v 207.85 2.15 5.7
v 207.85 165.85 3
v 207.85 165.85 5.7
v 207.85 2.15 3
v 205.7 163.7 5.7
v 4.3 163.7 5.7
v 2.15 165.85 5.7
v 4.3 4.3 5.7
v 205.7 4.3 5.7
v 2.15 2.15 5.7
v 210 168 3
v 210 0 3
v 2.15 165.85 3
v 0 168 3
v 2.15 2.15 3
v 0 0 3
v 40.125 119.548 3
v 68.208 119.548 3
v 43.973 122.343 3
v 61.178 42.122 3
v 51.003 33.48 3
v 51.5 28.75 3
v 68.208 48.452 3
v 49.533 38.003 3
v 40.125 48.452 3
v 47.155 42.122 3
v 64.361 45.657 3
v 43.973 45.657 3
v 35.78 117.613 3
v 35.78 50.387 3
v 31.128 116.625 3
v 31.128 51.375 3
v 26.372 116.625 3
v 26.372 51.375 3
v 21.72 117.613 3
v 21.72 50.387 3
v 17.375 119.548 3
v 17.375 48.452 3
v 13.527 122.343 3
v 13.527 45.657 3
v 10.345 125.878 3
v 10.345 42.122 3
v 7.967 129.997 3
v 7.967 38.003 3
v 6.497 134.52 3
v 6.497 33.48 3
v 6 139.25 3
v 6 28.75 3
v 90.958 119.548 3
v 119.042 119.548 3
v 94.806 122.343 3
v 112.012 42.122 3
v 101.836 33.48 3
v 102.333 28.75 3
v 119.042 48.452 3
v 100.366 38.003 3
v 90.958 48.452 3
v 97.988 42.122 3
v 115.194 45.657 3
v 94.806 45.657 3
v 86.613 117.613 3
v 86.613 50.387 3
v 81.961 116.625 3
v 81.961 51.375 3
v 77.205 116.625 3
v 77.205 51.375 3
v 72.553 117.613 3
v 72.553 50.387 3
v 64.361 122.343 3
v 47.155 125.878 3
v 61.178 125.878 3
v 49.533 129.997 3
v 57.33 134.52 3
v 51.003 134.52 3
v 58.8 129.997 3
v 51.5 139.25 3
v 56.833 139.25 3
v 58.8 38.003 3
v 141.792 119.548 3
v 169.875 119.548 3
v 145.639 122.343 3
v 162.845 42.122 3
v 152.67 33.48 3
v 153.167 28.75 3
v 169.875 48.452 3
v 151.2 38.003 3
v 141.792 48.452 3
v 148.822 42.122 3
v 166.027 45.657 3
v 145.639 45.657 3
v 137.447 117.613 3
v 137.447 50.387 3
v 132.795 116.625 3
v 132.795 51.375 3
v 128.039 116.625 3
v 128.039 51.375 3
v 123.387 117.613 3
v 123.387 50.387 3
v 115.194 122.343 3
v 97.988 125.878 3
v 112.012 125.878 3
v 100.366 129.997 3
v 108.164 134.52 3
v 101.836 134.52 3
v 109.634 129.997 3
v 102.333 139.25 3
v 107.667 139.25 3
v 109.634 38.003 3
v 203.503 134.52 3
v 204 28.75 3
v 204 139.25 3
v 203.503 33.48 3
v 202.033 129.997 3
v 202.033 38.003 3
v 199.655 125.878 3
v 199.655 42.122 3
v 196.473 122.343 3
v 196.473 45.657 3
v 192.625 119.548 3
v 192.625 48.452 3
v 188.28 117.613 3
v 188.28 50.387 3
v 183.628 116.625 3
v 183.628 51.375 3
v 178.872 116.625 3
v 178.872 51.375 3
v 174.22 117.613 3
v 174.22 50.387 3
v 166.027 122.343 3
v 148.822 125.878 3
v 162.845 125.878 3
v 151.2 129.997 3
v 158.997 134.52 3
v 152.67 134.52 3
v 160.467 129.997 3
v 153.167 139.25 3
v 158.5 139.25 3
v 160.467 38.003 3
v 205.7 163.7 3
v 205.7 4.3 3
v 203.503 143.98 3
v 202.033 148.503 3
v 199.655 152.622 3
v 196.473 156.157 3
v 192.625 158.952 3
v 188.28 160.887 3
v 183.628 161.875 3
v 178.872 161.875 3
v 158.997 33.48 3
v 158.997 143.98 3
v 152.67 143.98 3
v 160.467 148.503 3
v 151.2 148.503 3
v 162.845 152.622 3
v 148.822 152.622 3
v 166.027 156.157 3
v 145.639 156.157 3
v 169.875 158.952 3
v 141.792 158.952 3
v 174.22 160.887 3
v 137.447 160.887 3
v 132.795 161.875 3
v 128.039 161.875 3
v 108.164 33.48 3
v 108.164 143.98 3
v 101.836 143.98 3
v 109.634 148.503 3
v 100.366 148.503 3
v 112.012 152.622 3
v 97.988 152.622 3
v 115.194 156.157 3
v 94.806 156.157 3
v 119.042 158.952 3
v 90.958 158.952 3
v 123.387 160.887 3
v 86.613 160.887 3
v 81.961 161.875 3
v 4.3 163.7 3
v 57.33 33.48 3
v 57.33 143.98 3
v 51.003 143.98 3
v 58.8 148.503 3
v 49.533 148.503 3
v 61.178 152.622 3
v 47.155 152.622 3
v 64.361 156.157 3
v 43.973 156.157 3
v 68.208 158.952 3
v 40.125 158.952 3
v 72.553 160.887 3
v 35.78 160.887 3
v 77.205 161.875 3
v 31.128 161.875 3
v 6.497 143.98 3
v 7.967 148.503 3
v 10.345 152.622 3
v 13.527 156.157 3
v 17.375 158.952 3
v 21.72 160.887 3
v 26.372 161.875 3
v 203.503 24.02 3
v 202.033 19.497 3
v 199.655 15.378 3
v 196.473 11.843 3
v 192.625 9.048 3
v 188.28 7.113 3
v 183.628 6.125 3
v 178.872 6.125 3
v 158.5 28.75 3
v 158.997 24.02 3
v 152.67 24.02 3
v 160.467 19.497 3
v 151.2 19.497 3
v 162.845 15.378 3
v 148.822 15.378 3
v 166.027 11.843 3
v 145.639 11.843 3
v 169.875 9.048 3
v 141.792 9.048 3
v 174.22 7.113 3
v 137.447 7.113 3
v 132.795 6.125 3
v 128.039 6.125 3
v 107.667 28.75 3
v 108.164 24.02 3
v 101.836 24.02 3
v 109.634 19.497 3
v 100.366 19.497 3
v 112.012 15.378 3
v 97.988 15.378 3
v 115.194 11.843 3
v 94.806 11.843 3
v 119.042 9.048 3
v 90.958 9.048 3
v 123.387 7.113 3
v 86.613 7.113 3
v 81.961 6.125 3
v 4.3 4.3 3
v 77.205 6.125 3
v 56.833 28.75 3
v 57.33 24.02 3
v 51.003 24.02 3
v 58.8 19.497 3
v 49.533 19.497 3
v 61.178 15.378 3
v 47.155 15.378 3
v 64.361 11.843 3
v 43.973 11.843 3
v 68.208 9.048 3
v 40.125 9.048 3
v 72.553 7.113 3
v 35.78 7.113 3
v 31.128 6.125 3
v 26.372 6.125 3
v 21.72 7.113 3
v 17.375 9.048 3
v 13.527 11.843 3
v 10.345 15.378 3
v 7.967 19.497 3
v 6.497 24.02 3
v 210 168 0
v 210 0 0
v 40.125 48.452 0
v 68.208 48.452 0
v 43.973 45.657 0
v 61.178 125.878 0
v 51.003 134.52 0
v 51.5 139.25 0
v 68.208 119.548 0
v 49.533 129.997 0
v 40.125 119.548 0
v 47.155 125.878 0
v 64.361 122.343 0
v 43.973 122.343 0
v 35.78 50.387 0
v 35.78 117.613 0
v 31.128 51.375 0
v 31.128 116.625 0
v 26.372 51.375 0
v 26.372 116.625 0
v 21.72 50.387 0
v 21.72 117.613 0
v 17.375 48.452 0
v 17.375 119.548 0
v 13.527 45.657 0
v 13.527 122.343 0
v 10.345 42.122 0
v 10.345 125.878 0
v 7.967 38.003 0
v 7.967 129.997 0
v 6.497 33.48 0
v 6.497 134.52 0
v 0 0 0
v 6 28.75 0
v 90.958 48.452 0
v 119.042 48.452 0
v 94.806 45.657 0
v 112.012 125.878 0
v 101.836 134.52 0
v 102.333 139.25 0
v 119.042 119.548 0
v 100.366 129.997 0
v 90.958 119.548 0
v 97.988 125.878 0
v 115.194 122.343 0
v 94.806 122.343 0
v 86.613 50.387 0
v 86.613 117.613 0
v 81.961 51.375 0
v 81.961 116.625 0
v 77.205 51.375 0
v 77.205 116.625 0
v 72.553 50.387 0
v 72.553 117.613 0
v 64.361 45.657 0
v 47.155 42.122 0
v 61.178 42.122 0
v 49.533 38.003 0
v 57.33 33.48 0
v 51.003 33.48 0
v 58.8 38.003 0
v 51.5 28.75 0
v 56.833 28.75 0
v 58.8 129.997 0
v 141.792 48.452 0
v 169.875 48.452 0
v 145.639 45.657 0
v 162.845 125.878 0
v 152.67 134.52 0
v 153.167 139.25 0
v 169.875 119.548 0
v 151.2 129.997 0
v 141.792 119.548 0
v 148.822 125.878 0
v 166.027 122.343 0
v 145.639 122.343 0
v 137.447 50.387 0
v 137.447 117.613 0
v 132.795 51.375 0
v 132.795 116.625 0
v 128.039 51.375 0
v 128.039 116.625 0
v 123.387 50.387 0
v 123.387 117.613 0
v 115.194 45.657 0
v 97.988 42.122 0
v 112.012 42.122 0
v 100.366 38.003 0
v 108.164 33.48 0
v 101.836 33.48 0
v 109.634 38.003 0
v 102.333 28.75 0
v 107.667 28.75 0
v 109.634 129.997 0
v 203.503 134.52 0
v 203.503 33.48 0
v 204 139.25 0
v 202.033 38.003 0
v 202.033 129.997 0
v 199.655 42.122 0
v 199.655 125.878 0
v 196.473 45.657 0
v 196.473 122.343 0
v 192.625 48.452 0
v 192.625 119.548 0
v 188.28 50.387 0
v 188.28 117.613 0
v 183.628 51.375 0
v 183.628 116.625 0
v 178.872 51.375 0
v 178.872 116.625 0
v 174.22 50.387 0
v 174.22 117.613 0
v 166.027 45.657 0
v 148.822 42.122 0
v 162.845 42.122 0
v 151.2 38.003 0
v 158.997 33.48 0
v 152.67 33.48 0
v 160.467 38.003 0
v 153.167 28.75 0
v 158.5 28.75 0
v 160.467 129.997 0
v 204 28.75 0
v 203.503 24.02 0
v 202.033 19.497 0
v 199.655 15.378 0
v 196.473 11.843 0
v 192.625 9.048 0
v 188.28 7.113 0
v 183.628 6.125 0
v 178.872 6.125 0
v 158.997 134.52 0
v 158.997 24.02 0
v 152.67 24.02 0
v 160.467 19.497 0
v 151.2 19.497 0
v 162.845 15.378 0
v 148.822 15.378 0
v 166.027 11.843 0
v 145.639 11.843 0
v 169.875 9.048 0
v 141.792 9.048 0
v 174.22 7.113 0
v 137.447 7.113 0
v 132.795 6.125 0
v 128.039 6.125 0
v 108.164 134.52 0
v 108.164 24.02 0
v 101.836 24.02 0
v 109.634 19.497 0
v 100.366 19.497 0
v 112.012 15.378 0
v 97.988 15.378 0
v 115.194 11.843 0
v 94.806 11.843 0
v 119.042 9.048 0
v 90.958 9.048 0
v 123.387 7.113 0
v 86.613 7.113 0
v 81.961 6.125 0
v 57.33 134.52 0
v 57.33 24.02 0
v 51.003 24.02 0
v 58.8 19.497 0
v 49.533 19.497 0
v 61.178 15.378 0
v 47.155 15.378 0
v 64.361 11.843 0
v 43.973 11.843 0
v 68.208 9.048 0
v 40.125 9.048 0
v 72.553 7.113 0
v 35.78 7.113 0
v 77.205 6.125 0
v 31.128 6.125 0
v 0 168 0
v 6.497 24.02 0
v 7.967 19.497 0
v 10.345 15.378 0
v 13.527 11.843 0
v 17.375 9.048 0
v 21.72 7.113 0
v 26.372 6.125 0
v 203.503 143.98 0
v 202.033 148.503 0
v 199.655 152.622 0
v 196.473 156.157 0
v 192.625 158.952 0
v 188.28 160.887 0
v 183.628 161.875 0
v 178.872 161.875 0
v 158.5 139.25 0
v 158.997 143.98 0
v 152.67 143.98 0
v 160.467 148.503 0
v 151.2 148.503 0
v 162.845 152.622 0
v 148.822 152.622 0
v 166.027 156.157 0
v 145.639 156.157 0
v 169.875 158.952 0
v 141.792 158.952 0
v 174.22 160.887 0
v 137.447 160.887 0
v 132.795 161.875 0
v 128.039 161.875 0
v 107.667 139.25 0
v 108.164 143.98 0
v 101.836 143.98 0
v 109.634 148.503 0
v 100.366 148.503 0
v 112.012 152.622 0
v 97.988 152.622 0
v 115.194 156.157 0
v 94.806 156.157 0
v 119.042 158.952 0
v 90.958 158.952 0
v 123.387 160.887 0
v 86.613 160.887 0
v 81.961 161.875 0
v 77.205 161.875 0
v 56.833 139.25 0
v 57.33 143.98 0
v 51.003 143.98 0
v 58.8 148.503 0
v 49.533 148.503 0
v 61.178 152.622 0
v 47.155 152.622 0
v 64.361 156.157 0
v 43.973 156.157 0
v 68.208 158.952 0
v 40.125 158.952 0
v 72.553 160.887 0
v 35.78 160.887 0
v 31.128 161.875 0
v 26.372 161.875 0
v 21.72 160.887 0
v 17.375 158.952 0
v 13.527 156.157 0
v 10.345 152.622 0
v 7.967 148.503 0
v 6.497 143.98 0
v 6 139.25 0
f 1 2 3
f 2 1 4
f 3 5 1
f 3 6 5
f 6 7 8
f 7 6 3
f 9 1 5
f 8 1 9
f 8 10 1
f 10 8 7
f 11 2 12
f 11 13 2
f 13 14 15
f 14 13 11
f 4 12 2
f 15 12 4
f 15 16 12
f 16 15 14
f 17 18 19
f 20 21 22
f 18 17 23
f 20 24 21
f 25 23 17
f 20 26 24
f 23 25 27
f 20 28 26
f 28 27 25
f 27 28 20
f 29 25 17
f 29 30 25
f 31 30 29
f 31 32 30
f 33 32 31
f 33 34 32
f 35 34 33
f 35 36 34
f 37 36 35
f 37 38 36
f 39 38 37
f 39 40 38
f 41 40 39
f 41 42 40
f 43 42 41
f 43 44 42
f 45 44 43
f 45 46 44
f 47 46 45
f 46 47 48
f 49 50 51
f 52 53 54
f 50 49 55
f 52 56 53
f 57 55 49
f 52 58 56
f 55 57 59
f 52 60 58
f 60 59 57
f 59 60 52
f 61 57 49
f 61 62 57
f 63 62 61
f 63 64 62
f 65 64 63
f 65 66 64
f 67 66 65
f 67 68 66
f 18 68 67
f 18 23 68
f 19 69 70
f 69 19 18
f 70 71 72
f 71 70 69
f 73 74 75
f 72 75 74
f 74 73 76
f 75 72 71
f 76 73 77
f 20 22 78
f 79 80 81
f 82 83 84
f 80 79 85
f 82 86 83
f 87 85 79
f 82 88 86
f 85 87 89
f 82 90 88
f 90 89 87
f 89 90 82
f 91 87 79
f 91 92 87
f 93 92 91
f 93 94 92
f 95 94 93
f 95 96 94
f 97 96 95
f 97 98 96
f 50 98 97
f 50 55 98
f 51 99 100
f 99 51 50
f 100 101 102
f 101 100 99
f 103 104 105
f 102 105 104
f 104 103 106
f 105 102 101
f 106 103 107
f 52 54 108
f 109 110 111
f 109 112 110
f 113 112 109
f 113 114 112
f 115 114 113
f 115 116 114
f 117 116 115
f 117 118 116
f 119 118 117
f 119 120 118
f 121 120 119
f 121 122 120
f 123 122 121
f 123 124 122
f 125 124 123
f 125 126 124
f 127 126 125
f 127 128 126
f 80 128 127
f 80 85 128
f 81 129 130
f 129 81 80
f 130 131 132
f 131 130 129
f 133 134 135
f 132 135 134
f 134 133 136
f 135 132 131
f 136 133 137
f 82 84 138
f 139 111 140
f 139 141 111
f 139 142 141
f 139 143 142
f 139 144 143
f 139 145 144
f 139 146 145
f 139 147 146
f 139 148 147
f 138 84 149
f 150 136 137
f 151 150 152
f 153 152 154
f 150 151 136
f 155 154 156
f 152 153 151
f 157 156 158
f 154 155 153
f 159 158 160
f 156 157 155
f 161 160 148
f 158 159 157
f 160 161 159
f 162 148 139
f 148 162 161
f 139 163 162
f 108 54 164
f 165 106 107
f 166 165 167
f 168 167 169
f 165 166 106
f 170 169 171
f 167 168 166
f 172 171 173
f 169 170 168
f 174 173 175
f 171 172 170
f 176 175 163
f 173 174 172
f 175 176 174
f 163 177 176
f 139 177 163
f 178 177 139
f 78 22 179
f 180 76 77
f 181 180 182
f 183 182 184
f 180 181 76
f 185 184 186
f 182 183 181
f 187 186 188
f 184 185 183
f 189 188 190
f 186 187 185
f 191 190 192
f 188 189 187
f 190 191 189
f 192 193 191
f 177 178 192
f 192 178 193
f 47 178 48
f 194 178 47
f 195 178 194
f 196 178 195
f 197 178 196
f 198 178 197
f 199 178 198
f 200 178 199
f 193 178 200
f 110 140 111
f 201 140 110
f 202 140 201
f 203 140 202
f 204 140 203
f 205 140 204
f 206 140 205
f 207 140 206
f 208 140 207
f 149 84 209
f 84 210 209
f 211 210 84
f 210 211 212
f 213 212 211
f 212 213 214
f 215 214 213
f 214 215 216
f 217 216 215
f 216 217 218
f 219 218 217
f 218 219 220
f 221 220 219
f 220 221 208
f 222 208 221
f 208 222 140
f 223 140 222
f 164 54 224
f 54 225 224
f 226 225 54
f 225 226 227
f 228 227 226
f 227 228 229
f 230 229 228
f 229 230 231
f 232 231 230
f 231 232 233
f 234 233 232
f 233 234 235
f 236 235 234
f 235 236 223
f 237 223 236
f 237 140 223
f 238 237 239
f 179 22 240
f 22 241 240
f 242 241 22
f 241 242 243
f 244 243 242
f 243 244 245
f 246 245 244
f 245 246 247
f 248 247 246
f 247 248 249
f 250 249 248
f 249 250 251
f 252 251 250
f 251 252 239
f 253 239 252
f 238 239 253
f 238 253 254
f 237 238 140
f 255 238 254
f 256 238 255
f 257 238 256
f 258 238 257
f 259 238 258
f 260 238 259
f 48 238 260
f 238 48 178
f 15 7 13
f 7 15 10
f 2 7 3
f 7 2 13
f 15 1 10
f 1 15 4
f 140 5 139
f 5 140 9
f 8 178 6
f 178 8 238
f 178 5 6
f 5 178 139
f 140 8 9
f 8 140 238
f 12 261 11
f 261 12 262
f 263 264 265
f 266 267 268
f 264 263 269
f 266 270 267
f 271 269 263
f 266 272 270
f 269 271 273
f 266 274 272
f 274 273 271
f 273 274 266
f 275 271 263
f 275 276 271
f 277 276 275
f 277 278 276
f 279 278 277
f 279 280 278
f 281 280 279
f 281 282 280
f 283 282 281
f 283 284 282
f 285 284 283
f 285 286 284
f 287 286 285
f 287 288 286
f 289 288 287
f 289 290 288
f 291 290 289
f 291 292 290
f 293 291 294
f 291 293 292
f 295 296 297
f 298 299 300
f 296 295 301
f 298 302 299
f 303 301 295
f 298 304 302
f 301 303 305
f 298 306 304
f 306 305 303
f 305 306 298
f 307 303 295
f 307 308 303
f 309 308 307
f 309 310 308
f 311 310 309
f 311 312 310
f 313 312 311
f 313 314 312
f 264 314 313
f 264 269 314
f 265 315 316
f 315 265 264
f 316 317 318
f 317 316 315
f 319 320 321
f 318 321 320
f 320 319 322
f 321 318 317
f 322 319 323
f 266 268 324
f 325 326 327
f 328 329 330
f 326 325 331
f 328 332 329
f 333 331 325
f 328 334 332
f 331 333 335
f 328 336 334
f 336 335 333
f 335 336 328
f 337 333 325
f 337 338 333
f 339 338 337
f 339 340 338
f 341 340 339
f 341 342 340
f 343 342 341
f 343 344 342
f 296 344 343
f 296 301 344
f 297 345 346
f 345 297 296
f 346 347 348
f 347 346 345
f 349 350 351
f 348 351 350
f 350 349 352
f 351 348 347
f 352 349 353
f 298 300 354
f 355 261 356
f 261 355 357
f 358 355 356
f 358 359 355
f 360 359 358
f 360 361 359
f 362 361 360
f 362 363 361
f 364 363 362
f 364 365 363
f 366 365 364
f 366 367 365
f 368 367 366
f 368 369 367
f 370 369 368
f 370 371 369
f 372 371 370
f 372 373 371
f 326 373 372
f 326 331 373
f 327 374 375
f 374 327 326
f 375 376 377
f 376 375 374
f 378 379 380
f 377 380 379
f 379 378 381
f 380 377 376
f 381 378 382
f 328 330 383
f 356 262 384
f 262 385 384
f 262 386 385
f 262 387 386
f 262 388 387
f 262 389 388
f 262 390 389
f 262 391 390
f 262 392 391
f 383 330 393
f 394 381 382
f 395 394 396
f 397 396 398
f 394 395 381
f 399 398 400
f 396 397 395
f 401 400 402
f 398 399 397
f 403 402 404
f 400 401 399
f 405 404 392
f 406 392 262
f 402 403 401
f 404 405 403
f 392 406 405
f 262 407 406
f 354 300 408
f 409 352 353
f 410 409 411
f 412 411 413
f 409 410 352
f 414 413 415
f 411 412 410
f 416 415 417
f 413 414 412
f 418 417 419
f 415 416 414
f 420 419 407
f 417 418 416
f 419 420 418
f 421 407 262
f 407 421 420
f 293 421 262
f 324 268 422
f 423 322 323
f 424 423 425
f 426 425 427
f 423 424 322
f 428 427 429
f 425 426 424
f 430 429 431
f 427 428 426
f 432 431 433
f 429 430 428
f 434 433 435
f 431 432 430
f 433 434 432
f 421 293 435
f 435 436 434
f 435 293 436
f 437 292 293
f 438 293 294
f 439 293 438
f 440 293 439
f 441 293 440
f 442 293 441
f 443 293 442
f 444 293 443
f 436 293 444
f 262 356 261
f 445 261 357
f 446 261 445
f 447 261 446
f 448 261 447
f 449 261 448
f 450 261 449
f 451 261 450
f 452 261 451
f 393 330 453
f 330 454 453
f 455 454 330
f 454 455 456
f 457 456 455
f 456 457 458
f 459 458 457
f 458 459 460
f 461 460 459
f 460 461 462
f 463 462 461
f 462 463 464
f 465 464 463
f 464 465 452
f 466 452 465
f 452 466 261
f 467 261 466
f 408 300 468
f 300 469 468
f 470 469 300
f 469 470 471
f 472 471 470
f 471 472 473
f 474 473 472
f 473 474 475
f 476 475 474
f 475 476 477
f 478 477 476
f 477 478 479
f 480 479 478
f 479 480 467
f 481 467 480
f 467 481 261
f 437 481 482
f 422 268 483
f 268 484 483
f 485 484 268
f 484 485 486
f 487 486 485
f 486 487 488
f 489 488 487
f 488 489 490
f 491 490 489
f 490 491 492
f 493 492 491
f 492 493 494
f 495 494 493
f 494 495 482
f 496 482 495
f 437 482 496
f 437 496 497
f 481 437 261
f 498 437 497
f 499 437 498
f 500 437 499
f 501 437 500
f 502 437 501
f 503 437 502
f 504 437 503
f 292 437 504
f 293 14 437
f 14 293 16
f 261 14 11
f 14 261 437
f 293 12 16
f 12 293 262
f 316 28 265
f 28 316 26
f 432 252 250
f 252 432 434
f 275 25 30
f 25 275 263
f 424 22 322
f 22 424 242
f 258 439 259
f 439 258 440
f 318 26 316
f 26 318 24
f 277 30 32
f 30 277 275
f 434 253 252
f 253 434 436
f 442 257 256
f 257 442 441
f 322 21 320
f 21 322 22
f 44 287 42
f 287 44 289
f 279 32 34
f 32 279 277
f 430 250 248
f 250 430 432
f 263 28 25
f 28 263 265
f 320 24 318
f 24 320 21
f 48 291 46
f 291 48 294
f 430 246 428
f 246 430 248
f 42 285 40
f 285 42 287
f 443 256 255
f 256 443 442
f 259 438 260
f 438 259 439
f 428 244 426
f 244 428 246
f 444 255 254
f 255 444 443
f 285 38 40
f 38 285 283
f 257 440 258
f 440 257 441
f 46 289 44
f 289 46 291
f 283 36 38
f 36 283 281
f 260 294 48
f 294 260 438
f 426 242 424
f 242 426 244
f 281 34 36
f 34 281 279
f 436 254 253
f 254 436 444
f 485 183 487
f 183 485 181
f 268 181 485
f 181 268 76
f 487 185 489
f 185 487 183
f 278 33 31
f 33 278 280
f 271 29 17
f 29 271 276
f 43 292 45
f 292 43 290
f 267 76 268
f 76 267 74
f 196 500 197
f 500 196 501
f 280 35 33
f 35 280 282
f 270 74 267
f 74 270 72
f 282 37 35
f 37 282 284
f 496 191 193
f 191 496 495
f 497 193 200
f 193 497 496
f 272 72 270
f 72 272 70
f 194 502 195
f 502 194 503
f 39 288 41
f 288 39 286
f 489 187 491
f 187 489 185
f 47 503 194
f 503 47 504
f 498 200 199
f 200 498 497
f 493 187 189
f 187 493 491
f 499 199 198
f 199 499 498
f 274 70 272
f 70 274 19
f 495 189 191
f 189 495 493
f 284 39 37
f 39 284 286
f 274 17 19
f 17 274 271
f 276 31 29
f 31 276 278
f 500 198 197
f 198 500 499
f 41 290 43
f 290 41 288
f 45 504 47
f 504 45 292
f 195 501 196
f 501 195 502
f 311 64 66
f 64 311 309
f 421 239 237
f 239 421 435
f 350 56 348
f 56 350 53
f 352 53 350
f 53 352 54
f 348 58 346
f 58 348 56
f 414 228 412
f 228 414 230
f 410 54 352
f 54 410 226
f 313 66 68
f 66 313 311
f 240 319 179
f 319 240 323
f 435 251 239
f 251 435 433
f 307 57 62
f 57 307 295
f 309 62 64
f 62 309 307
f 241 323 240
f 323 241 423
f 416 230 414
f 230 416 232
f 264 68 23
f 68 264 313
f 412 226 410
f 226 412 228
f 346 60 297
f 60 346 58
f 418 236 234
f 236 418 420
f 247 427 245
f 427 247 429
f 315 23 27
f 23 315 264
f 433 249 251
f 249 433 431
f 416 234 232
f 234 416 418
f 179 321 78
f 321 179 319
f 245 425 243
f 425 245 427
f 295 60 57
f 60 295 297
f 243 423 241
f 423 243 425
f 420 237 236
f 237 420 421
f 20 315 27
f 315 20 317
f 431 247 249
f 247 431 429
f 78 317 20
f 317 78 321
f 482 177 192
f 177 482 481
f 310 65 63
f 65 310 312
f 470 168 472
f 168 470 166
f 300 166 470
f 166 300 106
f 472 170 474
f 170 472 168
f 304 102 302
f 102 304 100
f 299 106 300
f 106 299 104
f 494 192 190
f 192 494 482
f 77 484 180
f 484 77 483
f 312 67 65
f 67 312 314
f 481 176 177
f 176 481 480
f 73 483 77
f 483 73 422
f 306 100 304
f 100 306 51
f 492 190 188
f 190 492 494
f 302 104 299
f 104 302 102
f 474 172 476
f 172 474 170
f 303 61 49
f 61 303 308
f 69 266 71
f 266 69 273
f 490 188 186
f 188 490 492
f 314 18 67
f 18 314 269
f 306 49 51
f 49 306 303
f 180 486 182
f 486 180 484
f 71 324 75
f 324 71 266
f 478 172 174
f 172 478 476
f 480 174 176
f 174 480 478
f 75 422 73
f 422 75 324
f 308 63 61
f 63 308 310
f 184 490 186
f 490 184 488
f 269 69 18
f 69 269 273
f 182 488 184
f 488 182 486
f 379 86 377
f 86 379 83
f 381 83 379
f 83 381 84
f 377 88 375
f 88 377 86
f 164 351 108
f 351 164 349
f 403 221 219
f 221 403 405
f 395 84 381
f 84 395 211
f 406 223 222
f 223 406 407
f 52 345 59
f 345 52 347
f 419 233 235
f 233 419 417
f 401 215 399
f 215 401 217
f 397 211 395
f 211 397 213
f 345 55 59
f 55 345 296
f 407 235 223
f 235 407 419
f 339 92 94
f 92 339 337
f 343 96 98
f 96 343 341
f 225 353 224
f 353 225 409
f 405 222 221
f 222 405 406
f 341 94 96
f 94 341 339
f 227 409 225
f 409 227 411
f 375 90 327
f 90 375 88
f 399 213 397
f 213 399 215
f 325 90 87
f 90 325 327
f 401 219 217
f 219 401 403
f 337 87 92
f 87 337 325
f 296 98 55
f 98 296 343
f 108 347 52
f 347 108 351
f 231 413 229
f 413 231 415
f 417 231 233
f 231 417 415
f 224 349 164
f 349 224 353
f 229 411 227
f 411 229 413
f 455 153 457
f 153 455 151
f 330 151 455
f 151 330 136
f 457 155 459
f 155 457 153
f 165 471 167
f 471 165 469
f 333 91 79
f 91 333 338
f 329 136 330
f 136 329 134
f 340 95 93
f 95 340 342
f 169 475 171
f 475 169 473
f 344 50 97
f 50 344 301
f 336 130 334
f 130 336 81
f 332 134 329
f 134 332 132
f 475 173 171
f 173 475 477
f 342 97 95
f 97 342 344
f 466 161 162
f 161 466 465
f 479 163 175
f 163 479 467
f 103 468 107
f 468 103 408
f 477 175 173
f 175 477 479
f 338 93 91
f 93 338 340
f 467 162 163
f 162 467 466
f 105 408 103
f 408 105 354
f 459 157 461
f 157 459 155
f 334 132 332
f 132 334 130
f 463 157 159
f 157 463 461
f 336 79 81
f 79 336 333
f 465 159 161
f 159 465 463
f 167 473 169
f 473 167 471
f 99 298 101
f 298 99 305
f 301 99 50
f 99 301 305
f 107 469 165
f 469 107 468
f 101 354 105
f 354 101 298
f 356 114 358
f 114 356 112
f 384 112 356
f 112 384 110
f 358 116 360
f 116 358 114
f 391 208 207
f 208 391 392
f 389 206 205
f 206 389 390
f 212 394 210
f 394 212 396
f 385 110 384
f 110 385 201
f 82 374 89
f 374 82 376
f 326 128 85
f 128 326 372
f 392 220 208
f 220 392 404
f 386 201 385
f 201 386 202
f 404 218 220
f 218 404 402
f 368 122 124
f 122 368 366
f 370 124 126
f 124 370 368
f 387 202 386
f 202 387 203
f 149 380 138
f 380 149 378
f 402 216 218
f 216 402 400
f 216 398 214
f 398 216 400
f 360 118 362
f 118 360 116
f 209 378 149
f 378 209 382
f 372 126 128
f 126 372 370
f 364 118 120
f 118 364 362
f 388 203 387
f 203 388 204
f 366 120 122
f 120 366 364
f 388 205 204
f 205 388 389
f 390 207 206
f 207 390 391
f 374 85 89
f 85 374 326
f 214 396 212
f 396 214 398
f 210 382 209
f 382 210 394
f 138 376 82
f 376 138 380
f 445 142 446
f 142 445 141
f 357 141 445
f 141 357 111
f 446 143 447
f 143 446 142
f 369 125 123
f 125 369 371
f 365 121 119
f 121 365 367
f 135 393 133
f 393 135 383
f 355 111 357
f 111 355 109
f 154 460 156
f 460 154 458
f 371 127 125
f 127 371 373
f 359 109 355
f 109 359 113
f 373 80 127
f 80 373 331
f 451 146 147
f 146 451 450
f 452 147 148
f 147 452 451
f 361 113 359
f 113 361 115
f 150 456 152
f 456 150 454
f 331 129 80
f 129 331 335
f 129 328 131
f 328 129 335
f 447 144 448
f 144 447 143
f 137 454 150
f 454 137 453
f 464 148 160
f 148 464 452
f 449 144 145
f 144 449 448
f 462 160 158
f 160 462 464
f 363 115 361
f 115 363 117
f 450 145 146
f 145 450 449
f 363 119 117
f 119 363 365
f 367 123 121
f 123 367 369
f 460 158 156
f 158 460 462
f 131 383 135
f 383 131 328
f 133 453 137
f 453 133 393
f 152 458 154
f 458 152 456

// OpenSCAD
// Parameters //
// grid(x/y) is gridfinity grids
gridx = 5;
gridy = 4;
// hole(x/y) is kcup quantity
holex = 4;
holey = 2;


/* [Advance Variables] */
cube_length = gridx*42; 
cube_width = gridy*42;   
cube_thickness = 3; 

sc_offset = 2.15;
sc_height = 2.7 ;
hollow_offset = 2 * sc_offset;

sc_length = cube_length - sc_offset; //small cube
sc_width = cube_width - sc_offset;   
sc_thickness = cube_thickness - sc_offset; 


cylinder_diameter = 45.5; // Diameter of the cylinders
cylinder_height = cube_thickness; // Height of the cylinders, same as cube thickness
cylinder_spacing = 5.5; // Spacing between the cylinders
cylinder_count_x = holex; // Number of cylinders in the X direction
cylinder_count_y = holey; // Number of cylinders in the Y direction
cylinder_offset = 6; // Offset from the cube's sides



// Calculate spacing needed inside the cube
spacing_x = (cube_length - 2 * cylinder_offset - cylinder_diameter) / (cylinder_count_x - 1);
spacing_y = (cube_width - 2 * cylinder_offset - cylinder_diameter) / (cylinder_count_y - 1);

// Create the main cube


 
difference()  {
    
    union(){
    cube([cube_length,cube_width, cube_thickness]); // big boi
        union(){
          difference()  {
            translate([sc_offset,sc_offset,cube_thickness])
             cube([cube_length - 2*sc_offset,cube_width - 2*sc_offset, sc_height]); // small boi
                 
             translate([hollow_offset,hollow_offset,cube_thickness]) 
             cube([cube_length - 2*hollow_offset,cube_width - 2*hollow_offset, sc_height]);
                        }
               }  
           }
      
     // Create a grid of cylinders
     for (i = [0:cylinder_count_x - 1]) {
        for (j = [0:cylinder_count_y - 1]) {
            x = i * spacing_x + cylinder_offset + cylinder_diameter / 2;
            y = j * spacing_y + cylinder_offset + cylinder_diameter / 2;
            translate([x, y, 0])
            cylinder(cube_thickness+sc_height, cylinder_diameter / 2, cylinder_diameter / 2);
        

        
                                            }
   
                                         } 
              }
              
